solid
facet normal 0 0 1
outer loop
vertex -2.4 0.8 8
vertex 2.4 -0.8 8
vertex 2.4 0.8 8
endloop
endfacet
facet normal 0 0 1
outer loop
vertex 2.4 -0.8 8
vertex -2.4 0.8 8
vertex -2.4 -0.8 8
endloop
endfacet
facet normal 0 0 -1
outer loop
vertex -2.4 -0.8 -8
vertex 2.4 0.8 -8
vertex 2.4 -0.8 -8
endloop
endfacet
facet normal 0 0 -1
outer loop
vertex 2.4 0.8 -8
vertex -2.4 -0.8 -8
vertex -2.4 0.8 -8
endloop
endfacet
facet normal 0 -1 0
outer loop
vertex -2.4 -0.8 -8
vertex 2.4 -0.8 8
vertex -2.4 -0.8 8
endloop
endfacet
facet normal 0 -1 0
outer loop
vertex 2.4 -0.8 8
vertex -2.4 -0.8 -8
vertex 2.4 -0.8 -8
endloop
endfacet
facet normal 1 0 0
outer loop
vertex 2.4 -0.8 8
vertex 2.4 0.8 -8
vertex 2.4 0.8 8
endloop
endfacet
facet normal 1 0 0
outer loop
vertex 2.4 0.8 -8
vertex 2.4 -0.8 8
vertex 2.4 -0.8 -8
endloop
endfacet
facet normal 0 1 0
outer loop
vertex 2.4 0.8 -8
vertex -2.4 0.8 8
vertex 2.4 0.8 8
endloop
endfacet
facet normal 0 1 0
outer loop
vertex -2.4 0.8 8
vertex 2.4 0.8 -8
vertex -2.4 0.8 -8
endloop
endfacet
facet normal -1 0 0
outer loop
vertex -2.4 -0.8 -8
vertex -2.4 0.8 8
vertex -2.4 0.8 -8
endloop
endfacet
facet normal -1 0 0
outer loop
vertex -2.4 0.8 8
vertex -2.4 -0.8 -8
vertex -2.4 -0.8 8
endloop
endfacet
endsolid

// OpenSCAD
size=32; //block=32 //item=8

cube([size*0.15,size*0.05,size*0.5],center=true);
